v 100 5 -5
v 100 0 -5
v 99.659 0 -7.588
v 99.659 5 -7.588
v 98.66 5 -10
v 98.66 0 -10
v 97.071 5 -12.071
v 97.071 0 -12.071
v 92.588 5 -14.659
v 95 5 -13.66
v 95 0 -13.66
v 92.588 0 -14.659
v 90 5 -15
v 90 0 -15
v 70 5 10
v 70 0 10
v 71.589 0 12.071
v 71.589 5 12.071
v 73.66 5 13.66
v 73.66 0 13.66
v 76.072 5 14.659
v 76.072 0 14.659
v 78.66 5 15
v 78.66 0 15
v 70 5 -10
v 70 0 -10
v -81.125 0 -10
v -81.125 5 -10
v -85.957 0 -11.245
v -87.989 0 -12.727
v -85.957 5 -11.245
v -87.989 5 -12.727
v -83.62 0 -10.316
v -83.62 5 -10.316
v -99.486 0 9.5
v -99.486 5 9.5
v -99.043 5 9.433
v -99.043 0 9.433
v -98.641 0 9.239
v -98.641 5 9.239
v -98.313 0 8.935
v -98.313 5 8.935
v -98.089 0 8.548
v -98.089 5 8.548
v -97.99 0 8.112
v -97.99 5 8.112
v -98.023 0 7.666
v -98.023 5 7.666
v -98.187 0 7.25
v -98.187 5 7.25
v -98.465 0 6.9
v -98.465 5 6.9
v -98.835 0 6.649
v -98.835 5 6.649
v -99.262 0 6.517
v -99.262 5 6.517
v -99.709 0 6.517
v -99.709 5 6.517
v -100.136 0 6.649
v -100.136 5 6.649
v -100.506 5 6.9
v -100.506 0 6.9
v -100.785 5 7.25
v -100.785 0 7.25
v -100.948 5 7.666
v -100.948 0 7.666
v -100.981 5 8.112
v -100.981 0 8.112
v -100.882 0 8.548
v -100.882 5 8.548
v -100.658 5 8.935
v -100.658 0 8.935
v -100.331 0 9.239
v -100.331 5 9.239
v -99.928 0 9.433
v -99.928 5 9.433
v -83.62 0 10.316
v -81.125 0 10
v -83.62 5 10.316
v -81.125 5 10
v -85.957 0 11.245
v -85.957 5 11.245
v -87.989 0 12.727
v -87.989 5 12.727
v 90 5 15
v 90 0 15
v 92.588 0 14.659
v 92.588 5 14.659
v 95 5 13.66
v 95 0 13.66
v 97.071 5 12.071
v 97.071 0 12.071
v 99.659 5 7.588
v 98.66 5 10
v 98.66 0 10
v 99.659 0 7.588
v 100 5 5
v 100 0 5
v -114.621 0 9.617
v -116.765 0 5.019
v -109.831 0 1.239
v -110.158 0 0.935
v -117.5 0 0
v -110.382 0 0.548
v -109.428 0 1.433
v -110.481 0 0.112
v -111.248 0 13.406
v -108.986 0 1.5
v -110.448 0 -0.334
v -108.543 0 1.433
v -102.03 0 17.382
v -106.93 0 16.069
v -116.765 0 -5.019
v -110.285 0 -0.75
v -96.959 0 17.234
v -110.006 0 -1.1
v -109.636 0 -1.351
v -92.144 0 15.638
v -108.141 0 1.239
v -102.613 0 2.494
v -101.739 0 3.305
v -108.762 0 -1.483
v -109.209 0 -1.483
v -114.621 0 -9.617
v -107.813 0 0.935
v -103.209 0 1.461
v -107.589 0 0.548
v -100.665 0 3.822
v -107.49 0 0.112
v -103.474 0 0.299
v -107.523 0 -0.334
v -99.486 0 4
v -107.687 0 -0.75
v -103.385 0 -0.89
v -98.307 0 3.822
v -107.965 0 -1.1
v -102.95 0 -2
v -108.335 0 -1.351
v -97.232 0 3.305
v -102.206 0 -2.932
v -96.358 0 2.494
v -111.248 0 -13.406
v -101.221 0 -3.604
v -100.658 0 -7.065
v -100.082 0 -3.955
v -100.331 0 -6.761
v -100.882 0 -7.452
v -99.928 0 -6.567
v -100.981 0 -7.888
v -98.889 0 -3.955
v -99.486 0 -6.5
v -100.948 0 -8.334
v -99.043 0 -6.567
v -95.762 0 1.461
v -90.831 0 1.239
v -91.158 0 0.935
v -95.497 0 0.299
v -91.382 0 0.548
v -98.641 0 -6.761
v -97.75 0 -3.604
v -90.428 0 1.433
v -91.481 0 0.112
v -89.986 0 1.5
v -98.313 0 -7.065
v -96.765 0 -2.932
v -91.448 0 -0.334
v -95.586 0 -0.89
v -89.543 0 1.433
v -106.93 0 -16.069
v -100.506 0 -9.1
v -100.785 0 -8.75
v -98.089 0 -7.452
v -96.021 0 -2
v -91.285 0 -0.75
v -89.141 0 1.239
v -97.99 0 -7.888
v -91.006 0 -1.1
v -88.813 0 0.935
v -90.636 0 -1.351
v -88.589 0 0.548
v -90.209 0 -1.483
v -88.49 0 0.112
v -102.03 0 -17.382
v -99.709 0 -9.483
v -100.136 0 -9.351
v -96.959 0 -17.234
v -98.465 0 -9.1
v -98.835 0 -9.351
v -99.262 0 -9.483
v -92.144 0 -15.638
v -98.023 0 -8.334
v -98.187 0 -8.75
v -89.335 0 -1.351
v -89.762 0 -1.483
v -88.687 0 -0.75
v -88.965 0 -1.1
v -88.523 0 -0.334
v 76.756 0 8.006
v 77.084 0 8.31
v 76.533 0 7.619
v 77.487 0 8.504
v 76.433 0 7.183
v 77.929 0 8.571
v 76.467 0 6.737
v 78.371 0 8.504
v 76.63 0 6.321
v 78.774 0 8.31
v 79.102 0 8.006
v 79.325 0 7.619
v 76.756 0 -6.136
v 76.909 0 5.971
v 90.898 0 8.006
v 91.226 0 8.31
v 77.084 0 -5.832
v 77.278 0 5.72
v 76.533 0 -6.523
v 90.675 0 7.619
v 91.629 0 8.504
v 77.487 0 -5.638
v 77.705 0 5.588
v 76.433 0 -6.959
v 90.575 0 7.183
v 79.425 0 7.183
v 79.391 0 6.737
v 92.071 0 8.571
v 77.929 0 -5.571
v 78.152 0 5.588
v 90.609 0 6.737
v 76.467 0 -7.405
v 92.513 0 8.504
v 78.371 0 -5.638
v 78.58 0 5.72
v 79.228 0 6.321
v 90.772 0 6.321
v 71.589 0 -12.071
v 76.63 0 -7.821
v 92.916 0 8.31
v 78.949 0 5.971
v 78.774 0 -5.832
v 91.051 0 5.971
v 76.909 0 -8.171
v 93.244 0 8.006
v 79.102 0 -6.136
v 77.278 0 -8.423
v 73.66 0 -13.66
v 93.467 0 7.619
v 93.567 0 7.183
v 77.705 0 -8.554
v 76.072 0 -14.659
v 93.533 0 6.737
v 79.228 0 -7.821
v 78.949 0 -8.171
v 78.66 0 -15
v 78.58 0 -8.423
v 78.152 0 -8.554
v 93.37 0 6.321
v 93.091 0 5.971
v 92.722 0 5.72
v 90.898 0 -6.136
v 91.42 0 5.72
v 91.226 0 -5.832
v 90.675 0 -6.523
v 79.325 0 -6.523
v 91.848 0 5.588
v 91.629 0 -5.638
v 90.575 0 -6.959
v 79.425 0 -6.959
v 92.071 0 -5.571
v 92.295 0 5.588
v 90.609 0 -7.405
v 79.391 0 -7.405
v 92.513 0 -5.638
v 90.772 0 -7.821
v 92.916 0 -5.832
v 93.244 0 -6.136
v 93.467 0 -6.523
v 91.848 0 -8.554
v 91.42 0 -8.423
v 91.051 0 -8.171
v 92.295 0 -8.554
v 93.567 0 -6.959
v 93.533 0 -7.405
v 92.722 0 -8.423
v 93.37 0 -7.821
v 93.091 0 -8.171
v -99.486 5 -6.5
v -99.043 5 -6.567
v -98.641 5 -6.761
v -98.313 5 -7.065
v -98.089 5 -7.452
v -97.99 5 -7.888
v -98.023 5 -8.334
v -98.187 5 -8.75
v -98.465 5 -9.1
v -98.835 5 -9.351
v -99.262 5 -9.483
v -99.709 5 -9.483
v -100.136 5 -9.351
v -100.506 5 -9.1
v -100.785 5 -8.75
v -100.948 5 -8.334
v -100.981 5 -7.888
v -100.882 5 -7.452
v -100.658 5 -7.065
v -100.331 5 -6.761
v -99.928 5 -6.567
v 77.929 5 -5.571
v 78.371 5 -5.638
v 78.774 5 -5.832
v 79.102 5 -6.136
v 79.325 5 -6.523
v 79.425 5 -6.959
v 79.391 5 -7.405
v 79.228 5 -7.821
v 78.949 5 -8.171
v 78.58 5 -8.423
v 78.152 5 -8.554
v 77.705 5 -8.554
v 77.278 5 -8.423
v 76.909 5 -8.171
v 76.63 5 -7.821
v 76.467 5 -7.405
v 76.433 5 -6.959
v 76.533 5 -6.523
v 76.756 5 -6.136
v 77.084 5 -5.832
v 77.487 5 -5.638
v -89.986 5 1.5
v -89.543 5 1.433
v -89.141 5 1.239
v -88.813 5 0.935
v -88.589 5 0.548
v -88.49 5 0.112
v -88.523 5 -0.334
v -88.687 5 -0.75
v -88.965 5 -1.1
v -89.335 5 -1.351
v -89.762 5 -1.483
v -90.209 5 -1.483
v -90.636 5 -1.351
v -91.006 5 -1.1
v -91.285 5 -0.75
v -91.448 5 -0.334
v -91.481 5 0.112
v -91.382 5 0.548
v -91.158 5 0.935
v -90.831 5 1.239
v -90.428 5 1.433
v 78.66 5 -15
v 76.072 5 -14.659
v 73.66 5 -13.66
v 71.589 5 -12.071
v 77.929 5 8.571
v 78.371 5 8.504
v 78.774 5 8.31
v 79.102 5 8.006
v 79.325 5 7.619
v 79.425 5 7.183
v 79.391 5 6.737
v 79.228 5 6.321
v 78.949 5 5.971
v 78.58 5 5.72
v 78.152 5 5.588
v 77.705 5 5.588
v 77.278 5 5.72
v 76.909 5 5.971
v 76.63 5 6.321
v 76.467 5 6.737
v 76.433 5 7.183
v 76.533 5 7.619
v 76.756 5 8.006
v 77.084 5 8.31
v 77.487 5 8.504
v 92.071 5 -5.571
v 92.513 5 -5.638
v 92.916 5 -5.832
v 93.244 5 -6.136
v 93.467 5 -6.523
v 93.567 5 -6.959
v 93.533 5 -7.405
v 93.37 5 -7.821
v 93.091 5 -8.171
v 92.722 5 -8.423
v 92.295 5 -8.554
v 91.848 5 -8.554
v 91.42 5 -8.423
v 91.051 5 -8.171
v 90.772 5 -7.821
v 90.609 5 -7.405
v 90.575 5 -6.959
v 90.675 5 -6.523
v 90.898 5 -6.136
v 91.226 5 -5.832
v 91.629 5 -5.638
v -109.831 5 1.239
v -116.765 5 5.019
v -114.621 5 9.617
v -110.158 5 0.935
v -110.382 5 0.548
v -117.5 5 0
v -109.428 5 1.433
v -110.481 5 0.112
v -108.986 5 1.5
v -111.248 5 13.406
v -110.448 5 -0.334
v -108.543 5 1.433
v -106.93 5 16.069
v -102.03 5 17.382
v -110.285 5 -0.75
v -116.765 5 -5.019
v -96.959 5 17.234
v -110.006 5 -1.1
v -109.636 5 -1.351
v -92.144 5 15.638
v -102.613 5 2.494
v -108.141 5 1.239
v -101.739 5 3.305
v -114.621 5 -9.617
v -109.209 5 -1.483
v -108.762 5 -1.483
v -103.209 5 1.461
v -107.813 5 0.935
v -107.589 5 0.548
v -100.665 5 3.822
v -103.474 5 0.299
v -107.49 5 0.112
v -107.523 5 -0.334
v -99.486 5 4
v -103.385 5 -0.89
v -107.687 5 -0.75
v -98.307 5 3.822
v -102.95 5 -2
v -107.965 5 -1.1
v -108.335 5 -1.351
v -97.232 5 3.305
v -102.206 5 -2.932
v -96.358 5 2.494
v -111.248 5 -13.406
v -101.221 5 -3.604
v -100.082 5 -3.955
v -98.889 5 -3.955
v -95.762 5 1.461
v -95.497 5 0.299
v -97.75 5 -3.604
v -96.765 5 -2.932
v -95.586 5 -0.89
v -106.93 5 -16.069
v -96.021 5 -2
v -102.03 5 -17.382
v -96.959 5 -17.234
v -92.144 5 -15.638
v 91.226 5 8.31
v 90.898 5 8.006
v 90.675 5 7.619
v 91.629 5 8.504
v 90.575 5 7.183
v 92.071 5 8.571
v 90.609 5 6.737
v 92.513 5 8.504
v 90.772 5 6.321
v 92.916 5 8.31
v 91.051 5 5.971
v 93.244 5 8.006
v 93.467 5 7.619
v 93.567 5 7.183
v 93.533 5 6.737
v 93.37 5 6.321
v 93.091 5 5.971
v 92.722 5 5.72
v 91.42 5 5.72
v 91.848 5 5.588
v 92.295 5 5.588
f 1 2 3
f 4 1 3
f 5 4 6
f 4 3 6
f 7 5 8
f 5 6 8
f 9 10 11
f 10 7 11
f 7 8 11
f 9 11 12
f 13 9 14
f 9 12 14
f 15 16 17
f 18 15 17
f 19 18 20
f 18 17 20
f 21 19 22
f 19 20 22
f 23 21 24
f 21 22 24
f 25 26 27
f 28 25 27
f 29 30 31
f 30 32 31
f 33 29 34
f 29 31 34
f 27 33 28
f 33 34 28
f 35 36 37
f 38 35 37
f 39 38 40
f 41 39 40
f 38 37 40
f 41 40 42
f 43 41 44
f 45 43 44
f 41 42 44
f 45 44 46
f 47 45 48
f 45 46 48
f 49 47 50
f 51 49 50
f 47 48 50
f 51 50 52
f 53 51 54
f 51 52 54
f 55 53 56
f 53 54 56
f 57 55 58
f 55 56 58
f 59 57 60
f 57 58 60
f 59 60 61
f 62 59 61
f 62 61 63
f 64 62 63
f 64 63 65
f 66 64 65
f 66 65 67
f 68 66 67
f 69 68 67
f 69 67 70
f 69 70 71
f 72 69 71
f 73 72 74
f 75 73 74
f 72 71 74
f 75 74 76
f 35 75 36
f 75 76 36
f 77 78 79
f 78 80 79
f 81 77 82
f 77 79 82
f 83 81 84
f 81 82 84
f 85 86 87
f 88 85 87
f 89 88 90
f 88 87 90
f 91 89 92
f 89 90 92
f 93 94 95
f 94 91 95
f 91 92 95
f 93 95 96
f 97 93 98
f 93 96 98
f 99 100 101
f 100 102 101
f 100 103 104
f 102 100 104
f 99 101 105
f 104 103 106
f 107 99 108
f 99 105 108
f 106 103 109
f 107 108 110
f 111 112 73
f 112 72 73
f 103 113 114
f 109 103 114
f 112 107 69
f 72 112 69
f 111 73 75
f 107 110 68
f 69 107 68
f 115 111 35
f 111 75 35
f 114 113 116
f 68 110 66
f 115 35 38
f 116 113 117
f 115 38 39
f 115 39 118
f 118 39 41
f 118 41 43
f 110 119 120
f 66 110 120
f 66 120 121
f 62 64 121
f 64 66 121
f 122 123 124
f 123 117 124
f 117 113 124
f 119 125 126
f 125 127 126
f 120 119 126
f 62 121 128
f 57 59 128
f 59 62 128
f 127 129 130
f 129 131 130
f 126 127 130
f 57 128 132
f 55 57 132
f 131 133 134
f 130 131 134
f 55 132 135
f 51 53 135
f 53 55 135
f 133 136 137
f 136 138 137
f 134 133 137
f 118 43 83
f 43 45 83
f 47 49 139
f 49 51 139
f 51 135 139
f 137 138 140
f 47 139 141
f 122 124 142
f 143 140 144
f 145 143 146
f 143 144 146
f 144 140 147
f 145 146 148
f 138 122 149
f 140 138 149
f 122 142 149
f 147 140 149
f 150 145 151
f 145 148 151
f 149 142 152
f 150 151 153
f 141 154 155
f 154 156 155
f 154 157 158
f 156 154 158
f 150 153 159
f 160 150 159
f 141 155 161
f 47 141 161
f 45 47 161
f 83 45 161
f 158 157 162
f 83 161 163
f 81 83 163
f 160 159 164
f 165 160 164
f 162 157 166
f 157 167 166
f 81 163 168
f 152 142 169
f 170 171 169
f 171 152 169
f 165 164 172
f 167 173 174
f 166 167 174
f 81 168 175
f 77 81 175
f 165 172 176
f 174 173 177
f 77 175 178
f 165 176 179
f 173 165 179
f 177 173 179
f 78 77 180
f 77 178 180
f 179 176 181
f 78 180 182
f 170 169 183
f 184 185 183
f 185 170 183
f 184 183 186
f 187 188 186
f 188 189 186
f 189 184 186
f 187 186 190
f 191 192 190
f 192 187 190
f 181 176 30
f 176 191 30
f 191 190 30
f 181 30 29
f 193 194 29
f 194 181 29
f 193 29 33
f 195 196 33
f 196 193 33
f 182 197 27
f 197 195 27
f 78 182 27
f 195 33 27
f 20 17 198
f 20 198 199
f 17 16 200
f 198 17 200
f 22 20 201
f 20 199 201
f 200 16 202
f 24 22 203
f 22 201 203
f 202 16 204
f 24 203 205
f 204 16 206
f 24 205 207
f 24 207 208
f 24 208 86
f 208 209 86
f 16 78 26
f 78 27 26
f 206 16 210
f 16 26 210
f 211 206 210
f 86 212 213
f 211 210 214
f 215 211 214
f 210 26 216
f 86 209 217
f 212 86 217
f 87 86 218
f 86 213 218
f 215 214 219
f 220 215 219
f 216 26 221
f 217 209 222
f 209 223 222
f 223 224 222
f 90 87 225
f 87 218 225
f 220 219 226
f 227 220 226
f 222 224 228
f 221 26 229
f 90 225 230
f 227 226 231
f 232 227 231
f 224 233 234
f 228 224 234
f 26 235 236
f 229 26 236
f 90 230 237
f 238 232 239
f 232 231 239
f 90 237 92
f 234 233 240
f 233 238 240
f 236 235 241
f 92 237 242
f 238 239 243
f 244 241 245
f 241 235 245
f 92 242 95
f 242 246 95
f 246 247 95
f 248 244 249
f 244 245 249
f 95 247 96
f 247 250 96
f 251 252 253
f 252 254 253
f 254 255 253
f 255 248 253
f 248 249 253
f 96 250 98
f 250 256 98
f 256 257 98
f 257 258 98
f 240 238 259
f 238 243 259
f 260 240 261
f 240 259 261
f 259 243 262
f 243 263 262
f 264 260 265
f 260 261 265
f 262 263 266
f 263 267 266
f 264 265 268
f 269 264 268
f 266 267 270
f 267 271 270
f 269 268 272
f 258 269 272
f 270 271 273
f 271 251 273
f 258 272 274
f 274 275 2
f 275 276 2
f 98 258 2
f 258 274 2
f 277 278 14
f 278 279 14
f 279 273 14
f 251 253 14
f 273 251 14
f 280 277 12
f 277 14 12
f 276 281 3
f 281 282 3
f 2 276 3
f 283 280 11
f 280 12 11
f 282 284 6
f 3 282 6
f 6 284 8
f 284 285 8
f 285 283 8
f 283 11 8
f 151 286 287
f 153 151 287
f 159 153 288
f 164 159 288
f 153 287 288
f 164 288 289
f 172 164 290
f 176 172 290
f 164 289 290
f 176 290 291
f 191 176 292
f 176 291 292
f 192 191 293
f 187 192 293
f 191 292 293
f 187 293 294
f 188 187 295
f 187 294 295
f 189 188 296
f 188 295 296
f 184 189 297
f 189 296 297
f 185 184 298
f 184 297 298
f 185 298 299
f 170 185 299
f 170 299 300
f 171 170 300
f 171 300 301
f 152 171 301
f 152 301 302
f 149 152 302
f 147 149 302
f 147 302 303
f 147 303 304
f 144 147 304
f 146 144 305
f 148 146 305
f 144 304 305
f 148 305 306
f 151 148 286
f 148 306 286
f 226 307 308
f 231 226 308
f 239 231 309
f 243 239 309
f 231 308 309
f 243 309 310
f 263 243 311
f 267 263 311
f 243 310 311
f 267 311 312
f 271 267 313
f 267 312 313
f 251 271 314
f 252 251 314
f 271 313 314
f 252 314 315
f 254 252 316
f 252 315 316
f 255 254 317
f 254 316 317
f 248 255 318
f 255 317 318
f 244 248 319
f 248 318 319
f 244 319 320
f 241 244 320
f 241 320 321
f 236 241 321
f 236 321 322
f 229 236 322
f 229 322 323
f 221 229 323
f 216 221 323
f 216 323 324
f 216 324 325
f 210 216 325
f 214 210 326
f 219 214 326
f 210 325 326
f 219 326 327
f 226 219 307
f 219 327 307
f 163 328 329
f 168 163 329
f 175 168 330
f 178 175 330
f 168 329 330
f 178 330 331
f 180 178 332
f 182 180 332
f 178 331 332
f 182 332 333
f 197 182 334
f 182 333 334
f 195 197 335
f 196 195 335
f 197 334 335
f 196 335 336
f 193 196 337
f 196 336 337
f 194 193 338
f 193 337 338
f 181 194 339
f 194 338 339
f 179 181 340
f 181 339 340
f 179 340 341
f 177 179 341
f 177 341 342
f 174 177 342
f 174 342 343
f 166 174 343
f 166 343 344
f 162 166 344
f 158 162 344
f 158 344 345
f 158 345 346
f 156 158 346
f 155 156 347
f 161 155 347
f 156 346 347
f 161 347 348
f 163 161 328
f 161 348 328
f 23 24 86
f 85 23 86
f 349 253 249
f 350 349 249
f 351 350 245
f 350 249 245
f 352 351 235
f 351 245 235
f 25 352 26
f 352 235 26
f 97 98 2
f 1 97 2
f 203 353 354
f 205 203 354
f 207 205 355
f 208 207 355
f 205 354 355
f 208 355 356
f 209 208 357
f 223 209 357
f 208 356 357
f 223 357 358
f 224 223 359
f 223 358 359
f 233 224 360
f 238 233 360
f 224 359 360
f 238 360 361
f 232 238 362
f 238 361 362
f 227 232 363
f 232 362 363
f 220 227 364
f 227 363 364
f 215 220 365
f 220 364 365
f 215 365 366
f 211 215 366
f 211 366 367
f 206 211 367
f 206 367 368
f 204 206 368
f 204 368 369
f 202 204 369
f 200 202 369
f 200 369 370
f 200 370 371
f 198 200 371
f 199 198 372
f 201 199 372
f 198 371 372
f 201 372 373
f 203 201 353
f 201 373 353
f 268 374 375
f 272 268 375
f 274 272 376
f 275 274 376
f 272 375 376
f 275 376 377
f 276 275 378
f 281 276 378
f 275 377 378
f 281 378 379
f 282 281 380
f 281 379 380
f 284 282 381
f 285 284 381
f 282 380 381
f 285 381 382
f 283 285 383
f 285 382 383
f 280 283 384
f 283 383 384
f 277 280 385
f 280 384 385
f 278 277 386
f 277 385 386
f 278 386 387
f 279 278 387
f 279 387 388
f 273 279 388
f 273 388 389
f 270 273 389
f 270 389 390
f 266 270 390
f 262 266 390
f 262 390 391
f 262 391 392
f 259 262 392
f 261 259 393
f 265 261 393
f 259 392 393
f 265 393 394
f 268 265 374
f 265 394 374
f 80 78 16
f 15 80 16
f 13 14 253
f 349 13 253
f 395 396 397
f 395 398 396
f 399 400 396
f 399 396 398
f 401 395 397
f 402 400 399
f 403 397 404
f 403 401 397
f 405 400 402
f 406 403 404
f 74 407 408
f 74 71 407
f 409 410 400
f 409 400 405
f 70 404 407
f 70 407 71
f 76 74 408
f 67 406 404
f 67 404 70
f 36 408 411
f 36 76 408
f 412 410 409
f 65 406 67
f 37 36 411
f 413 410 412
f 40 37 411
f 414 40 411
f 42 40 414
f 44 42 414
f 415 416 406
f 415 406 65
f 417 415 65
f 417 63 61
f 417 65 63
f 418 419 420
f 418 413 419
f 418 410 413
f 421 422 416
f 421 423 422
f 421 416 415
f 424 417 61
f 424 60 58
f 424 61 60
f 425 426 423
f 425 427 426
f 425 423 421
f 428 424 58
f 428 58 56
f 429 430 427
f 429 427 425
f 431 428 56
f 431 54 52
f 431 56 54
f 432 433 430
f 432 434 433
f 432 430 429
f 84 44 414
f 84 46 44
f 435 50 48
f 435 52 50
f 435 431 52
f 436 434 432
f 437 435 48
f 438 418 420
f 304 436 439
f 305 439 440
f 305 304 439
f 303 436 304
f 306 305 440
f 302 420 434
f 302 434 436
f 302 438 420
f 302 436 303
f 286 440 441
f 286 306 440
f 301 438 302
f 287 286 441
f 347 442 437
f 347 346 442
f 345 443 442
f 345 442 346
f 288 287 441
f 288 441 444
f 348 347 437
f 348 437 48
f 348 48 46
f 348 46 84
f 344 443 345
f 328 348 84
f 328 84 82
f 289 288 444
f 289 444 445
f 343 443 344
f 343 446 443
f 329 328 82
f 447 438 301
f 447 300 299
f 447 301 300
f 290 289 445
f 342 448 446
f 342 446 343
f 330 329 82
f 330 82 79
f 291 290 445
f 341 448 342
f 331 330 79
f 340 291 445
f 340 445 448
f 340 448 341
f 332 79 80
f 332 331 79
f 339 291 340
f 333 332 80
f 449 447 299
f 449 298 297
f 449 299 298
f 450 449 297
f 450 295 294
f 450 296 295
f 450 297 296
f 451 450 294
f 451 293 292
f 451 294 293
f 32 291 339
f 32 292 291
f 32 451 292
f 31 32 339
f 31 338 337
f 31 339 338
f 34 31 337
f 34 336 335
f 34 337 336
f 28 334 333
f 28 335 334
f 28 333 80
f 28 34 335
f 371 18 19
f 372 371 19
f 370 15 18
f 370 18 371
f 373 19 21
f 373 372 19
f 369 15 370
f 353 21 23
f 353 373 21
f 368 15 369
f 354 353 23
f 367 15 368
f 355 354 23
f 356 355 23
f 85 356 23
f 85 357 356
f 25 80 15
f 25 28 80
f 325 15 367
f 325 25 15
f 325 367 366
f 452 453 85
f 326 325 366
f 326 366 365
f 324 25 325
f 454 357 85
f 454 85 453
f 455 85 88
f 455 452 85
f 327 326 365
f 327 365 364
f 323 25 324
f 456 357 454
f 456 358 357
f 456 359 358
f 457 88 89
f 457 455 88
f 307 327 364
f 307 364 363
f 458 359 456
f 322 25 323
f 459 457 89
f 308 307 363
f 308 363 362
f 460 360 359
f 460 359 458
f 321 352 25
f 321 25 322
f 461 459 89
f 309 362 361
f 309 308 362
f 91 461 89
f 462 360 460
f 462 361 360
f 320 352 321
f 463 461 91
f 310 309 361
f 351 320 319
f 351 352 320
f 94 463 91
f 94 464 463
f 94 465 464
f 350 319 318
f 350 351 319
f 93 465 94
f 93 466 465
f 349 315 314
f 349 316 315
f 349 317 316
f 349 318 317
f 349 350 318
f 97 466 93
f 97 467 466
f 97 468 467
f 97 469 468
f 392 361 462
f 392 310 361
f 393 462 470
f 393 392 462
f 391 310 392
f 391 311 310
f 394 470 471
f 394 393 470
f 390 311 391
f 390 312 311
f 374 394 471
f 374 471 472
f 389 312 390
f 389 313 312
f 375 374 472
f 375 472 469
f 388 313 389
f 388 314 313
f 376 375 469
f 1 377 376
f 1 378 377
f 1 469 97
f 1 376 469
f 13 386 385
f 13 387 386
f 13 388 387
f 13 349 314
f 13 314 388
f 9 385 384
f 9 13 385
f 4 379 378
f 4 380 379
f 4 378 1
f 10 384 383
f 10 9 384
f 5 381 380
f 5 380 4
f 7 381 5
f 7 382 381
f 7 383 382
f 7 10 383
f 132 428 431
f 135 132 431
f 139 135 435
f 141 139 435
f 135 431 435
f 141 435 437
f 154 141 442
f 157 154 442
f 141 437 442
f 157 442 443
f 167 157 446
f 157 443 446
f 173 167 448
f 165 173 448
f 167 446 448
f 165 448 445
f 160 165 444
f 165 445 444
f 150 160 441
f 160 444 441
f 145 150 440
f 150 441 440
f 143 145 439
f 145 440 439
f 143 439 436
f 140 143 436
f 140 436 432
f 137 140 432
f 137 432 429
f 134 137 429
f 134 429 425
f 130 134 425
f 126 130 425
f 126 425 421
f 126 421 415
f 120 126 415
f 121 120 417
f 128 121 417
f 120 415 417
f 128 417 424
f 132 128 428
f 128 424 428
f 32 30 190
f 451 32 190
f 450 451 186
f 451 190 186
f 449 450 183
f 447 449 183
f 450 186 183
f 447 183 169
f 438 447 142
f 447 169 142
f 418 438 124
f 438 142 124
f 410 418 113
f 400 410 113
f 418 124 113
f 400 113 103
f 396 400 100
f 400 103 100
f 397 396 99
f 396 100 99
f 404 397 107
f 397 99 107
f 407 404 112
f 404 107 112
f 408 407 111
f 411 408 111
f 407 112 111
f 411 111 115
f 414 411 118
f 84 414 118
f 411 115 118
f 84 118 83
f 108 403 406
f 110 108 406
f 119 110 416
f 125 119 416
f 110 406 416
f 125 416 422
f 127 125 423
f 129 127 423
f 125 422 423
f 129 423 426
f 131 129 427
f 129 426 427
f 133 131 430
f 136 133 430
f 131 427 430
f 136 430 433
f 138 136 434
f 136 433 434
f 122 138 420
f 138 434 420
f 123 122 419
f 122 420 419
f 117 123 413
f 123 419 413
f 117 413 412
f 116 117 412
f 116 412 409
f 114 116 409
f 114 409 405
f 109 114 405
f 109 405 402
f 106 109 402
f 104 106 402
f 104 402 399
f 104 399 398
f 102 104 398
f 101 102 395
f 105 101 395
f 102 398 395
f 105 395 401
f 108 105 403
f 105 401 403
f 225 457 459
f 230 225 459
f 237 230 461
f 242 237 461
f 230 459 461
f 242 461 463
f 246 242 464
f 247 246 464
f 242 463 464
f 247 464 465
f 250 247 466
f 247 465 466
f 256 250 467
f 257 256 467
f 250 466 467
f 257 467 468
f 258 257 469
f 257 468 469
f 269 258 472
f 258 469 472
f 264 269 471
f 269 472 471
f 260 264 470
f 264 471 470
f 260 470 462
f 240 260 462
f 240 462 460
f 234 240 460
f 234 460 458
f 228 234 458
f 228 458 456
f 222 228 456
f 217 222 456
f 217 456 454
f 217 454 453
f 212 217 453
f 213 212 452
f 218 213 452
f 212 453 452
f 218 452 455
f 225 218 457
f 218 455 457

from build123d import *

# Parameters (mm, degrees)
BOSS_EXTRUDE1_DEPTH = 5
SKETCH2_R           = 4
SKETCH2_R_2         = 1.5
CUT_EXTRUDE1_DEPTH  = 5
SKETCH3_R           = 1.5
CUT_EXTRUDE2_DEPTH  = 5
FILLET3_R           = 10
FILLET4_R           = 10


with BuildPart() as part:
    # Sketch1 → Boss-Extrude1 (new body)
    with BuildSketch(Plane(origin=(0, 0, 0), x_dir=(1, 0, 0), z_dir=(0, 1, 0))):
        Polygon((-85.638593384, 10), (-100, 10), (-100, -10), (-85.638593384, -10), (70, -10), (70, -15), (100, -15), (100, -10), (100, 10), (100, 15), (70, 15), (70, 10), align=None)
        with BuildLine():
            Line((-100, -10), (-100, 10))
            Line((-100, 10), (-85.638593384, 10))
            ThreePointArc((-85.638593384, 10), (-117.5, 0), (-85.638593384, -10))
            Line((-85.638593384, -10), (-100, -10))
        make_face()
    extrude(amount=BOSS_EXTRUDE1_DEPTH)

    # Sketch2 → Cut-Extrude1 (cut)
    with BuildSketch(Plane(origin=(0, 5, 0), x_dir=(1, 0, 0), z_dir=(0, 1, 0))):
        with Locations(Location((-99.485581351, 0, 0), (0, 0, 270))):
            Circle(SKETCH2_R)
        with Locations(Location((-99.485581351, 8, 0), (0, 0, 270))):
            Circle(SKETCH2_R_2)
        with Locations(Location((-99.485581351, -8, 0), (0, 0, 270))):
            Circle(SKETCH2_R_2)
        with Locations(Location((-108.985581351, 0, 0), (0, 0, 270))):
            Circle(SKETCH2_R_2)
        with Locations(Location((-89.985581351, 0, 0), (0, 0, 270))):
            Circle(SKETCH2_R_2)
    extrude(amount=-CUT_EXTRUDE1_DEPTH, mode=Mode.SUBTRACT)

    # Sketch3 → Cut-Extrude2 (cut)
    with BuildSketch(Plane(origin=(0, 5, 0), x_dir=(1, 0, 0), z_dir=(0, 1, 0))):
        with Locations(Location((77.928932188, 7.071067812, 0), (0, 0, 270))):
            Circle(SKETCH3_R)
        with Locations(Location((92.071067812, 7.071067812, 0), (0, 0, 270))):
            Circle(SKETCH3_R)
        with Locations(Location((92.071067812, -7.071067812, 0), (0, 0, 270))):
            Circle(SKETCH3_R)
        with Locations(Location((77.928932188, -7.071067812, 0), (0, 0, 270))):
            Circle(SKETCH3_R)
    extrude(amount=-CUT_EXTRUDE2_DEPTH, mode=Mode.SUBTRACT)

    # Fillet3
    # the kernel refuses this fillet: 10 mm, written as the material it takes off along each edge
    with BuildSketch(Plane(origin=(70, -21.650635095, 15), x_dir=(0, 0, -1), z_dir=(0, 1, 0))) as fillet3_piece_1:
        with BuildLine():
            CenterArc((10, -8.660254038), FILLET3_R, 120, 60)
            Line((0, -8.660254038), (-0.2, -8.660254038))
            Line((-0.2, -8.660254038), (-0.2, 0))
            Line((-0.2, 0), (0, 0.2))
            ThreePointArc((0, 0.2), (2.5, 0.2), (4.9, 0.173205081))
            Line((4.9, 0.173205081), (5, 0))
        make_face()
    extrude(amount=48.301270189, mode=Mode.SUBTRACT)
    with BuildSketch(Plane(origin=(100, -25, 15), x_dir=(0, 0, -1), z_dir=(0, 1, 0)), Plane(origin=(100, -25, -15), x_dir=(-1, 0, 0), z_dir=(0, 1, 0))) as fillet3_piece_2:
        with BuildLine():
            CenterArc((FILLET3_R, FILLET3_R), FILLET3_R, 180, 90)
            Line((0, FILLET3_R), (-FILLET3_R * 0.02, FILLET3_R))
            Line((-FILLET3_R * 0.02, FILLET3_R), (-FILLET3_R * 0.02, -FILLET3_R * 0.02))
            Line((-FILLET3_R * 0.02, -FILLET3_R * 0.02), (FILLET3_R, -FILLET3_R * 0.02))
            Line((FILLET3_R, -FILLET3_R * 0.02), (FILLET3_R, 0))
        make_face()
    extrude(amount=55, mode=Mode.SUBTRACT)
    with BuildSketch(Plane(origin=(70, -21.650635095, -15), x_dir=(0, 0, 1), z_dir=(0, 1, 0))) as fillet3_piece_3:
        with BuildLine():
            CenterArc((10, 8.660254038), FILLET3_R, 180, 60)
            Line((0, 8.660254038), (-0.2, 8.660254038))
            Line((-0.2, 8.660254038), (-0.2, 0))
            Line((-0.2, 0), (0, -0.2))
            ThreePointArc((0, -0.2), (2.5, -0.2), (4.9, -0.173205081))
            Line((4.9, -0.173205081), (5, 0))
        make_face()
    extrude(amount=48.301270189, mode=Mode.SUBTRACT)

    # Fillet4
    fillet4_edges = [part.edges().sort_by_distance(p)[0] for p in [
        (-85.638593384, 2.5, -10),
        (-85.638593384, 2.5, 10),
    ]]
    fillet(fillet4_edges, radius=FILLET4_R)


solid = part.part
